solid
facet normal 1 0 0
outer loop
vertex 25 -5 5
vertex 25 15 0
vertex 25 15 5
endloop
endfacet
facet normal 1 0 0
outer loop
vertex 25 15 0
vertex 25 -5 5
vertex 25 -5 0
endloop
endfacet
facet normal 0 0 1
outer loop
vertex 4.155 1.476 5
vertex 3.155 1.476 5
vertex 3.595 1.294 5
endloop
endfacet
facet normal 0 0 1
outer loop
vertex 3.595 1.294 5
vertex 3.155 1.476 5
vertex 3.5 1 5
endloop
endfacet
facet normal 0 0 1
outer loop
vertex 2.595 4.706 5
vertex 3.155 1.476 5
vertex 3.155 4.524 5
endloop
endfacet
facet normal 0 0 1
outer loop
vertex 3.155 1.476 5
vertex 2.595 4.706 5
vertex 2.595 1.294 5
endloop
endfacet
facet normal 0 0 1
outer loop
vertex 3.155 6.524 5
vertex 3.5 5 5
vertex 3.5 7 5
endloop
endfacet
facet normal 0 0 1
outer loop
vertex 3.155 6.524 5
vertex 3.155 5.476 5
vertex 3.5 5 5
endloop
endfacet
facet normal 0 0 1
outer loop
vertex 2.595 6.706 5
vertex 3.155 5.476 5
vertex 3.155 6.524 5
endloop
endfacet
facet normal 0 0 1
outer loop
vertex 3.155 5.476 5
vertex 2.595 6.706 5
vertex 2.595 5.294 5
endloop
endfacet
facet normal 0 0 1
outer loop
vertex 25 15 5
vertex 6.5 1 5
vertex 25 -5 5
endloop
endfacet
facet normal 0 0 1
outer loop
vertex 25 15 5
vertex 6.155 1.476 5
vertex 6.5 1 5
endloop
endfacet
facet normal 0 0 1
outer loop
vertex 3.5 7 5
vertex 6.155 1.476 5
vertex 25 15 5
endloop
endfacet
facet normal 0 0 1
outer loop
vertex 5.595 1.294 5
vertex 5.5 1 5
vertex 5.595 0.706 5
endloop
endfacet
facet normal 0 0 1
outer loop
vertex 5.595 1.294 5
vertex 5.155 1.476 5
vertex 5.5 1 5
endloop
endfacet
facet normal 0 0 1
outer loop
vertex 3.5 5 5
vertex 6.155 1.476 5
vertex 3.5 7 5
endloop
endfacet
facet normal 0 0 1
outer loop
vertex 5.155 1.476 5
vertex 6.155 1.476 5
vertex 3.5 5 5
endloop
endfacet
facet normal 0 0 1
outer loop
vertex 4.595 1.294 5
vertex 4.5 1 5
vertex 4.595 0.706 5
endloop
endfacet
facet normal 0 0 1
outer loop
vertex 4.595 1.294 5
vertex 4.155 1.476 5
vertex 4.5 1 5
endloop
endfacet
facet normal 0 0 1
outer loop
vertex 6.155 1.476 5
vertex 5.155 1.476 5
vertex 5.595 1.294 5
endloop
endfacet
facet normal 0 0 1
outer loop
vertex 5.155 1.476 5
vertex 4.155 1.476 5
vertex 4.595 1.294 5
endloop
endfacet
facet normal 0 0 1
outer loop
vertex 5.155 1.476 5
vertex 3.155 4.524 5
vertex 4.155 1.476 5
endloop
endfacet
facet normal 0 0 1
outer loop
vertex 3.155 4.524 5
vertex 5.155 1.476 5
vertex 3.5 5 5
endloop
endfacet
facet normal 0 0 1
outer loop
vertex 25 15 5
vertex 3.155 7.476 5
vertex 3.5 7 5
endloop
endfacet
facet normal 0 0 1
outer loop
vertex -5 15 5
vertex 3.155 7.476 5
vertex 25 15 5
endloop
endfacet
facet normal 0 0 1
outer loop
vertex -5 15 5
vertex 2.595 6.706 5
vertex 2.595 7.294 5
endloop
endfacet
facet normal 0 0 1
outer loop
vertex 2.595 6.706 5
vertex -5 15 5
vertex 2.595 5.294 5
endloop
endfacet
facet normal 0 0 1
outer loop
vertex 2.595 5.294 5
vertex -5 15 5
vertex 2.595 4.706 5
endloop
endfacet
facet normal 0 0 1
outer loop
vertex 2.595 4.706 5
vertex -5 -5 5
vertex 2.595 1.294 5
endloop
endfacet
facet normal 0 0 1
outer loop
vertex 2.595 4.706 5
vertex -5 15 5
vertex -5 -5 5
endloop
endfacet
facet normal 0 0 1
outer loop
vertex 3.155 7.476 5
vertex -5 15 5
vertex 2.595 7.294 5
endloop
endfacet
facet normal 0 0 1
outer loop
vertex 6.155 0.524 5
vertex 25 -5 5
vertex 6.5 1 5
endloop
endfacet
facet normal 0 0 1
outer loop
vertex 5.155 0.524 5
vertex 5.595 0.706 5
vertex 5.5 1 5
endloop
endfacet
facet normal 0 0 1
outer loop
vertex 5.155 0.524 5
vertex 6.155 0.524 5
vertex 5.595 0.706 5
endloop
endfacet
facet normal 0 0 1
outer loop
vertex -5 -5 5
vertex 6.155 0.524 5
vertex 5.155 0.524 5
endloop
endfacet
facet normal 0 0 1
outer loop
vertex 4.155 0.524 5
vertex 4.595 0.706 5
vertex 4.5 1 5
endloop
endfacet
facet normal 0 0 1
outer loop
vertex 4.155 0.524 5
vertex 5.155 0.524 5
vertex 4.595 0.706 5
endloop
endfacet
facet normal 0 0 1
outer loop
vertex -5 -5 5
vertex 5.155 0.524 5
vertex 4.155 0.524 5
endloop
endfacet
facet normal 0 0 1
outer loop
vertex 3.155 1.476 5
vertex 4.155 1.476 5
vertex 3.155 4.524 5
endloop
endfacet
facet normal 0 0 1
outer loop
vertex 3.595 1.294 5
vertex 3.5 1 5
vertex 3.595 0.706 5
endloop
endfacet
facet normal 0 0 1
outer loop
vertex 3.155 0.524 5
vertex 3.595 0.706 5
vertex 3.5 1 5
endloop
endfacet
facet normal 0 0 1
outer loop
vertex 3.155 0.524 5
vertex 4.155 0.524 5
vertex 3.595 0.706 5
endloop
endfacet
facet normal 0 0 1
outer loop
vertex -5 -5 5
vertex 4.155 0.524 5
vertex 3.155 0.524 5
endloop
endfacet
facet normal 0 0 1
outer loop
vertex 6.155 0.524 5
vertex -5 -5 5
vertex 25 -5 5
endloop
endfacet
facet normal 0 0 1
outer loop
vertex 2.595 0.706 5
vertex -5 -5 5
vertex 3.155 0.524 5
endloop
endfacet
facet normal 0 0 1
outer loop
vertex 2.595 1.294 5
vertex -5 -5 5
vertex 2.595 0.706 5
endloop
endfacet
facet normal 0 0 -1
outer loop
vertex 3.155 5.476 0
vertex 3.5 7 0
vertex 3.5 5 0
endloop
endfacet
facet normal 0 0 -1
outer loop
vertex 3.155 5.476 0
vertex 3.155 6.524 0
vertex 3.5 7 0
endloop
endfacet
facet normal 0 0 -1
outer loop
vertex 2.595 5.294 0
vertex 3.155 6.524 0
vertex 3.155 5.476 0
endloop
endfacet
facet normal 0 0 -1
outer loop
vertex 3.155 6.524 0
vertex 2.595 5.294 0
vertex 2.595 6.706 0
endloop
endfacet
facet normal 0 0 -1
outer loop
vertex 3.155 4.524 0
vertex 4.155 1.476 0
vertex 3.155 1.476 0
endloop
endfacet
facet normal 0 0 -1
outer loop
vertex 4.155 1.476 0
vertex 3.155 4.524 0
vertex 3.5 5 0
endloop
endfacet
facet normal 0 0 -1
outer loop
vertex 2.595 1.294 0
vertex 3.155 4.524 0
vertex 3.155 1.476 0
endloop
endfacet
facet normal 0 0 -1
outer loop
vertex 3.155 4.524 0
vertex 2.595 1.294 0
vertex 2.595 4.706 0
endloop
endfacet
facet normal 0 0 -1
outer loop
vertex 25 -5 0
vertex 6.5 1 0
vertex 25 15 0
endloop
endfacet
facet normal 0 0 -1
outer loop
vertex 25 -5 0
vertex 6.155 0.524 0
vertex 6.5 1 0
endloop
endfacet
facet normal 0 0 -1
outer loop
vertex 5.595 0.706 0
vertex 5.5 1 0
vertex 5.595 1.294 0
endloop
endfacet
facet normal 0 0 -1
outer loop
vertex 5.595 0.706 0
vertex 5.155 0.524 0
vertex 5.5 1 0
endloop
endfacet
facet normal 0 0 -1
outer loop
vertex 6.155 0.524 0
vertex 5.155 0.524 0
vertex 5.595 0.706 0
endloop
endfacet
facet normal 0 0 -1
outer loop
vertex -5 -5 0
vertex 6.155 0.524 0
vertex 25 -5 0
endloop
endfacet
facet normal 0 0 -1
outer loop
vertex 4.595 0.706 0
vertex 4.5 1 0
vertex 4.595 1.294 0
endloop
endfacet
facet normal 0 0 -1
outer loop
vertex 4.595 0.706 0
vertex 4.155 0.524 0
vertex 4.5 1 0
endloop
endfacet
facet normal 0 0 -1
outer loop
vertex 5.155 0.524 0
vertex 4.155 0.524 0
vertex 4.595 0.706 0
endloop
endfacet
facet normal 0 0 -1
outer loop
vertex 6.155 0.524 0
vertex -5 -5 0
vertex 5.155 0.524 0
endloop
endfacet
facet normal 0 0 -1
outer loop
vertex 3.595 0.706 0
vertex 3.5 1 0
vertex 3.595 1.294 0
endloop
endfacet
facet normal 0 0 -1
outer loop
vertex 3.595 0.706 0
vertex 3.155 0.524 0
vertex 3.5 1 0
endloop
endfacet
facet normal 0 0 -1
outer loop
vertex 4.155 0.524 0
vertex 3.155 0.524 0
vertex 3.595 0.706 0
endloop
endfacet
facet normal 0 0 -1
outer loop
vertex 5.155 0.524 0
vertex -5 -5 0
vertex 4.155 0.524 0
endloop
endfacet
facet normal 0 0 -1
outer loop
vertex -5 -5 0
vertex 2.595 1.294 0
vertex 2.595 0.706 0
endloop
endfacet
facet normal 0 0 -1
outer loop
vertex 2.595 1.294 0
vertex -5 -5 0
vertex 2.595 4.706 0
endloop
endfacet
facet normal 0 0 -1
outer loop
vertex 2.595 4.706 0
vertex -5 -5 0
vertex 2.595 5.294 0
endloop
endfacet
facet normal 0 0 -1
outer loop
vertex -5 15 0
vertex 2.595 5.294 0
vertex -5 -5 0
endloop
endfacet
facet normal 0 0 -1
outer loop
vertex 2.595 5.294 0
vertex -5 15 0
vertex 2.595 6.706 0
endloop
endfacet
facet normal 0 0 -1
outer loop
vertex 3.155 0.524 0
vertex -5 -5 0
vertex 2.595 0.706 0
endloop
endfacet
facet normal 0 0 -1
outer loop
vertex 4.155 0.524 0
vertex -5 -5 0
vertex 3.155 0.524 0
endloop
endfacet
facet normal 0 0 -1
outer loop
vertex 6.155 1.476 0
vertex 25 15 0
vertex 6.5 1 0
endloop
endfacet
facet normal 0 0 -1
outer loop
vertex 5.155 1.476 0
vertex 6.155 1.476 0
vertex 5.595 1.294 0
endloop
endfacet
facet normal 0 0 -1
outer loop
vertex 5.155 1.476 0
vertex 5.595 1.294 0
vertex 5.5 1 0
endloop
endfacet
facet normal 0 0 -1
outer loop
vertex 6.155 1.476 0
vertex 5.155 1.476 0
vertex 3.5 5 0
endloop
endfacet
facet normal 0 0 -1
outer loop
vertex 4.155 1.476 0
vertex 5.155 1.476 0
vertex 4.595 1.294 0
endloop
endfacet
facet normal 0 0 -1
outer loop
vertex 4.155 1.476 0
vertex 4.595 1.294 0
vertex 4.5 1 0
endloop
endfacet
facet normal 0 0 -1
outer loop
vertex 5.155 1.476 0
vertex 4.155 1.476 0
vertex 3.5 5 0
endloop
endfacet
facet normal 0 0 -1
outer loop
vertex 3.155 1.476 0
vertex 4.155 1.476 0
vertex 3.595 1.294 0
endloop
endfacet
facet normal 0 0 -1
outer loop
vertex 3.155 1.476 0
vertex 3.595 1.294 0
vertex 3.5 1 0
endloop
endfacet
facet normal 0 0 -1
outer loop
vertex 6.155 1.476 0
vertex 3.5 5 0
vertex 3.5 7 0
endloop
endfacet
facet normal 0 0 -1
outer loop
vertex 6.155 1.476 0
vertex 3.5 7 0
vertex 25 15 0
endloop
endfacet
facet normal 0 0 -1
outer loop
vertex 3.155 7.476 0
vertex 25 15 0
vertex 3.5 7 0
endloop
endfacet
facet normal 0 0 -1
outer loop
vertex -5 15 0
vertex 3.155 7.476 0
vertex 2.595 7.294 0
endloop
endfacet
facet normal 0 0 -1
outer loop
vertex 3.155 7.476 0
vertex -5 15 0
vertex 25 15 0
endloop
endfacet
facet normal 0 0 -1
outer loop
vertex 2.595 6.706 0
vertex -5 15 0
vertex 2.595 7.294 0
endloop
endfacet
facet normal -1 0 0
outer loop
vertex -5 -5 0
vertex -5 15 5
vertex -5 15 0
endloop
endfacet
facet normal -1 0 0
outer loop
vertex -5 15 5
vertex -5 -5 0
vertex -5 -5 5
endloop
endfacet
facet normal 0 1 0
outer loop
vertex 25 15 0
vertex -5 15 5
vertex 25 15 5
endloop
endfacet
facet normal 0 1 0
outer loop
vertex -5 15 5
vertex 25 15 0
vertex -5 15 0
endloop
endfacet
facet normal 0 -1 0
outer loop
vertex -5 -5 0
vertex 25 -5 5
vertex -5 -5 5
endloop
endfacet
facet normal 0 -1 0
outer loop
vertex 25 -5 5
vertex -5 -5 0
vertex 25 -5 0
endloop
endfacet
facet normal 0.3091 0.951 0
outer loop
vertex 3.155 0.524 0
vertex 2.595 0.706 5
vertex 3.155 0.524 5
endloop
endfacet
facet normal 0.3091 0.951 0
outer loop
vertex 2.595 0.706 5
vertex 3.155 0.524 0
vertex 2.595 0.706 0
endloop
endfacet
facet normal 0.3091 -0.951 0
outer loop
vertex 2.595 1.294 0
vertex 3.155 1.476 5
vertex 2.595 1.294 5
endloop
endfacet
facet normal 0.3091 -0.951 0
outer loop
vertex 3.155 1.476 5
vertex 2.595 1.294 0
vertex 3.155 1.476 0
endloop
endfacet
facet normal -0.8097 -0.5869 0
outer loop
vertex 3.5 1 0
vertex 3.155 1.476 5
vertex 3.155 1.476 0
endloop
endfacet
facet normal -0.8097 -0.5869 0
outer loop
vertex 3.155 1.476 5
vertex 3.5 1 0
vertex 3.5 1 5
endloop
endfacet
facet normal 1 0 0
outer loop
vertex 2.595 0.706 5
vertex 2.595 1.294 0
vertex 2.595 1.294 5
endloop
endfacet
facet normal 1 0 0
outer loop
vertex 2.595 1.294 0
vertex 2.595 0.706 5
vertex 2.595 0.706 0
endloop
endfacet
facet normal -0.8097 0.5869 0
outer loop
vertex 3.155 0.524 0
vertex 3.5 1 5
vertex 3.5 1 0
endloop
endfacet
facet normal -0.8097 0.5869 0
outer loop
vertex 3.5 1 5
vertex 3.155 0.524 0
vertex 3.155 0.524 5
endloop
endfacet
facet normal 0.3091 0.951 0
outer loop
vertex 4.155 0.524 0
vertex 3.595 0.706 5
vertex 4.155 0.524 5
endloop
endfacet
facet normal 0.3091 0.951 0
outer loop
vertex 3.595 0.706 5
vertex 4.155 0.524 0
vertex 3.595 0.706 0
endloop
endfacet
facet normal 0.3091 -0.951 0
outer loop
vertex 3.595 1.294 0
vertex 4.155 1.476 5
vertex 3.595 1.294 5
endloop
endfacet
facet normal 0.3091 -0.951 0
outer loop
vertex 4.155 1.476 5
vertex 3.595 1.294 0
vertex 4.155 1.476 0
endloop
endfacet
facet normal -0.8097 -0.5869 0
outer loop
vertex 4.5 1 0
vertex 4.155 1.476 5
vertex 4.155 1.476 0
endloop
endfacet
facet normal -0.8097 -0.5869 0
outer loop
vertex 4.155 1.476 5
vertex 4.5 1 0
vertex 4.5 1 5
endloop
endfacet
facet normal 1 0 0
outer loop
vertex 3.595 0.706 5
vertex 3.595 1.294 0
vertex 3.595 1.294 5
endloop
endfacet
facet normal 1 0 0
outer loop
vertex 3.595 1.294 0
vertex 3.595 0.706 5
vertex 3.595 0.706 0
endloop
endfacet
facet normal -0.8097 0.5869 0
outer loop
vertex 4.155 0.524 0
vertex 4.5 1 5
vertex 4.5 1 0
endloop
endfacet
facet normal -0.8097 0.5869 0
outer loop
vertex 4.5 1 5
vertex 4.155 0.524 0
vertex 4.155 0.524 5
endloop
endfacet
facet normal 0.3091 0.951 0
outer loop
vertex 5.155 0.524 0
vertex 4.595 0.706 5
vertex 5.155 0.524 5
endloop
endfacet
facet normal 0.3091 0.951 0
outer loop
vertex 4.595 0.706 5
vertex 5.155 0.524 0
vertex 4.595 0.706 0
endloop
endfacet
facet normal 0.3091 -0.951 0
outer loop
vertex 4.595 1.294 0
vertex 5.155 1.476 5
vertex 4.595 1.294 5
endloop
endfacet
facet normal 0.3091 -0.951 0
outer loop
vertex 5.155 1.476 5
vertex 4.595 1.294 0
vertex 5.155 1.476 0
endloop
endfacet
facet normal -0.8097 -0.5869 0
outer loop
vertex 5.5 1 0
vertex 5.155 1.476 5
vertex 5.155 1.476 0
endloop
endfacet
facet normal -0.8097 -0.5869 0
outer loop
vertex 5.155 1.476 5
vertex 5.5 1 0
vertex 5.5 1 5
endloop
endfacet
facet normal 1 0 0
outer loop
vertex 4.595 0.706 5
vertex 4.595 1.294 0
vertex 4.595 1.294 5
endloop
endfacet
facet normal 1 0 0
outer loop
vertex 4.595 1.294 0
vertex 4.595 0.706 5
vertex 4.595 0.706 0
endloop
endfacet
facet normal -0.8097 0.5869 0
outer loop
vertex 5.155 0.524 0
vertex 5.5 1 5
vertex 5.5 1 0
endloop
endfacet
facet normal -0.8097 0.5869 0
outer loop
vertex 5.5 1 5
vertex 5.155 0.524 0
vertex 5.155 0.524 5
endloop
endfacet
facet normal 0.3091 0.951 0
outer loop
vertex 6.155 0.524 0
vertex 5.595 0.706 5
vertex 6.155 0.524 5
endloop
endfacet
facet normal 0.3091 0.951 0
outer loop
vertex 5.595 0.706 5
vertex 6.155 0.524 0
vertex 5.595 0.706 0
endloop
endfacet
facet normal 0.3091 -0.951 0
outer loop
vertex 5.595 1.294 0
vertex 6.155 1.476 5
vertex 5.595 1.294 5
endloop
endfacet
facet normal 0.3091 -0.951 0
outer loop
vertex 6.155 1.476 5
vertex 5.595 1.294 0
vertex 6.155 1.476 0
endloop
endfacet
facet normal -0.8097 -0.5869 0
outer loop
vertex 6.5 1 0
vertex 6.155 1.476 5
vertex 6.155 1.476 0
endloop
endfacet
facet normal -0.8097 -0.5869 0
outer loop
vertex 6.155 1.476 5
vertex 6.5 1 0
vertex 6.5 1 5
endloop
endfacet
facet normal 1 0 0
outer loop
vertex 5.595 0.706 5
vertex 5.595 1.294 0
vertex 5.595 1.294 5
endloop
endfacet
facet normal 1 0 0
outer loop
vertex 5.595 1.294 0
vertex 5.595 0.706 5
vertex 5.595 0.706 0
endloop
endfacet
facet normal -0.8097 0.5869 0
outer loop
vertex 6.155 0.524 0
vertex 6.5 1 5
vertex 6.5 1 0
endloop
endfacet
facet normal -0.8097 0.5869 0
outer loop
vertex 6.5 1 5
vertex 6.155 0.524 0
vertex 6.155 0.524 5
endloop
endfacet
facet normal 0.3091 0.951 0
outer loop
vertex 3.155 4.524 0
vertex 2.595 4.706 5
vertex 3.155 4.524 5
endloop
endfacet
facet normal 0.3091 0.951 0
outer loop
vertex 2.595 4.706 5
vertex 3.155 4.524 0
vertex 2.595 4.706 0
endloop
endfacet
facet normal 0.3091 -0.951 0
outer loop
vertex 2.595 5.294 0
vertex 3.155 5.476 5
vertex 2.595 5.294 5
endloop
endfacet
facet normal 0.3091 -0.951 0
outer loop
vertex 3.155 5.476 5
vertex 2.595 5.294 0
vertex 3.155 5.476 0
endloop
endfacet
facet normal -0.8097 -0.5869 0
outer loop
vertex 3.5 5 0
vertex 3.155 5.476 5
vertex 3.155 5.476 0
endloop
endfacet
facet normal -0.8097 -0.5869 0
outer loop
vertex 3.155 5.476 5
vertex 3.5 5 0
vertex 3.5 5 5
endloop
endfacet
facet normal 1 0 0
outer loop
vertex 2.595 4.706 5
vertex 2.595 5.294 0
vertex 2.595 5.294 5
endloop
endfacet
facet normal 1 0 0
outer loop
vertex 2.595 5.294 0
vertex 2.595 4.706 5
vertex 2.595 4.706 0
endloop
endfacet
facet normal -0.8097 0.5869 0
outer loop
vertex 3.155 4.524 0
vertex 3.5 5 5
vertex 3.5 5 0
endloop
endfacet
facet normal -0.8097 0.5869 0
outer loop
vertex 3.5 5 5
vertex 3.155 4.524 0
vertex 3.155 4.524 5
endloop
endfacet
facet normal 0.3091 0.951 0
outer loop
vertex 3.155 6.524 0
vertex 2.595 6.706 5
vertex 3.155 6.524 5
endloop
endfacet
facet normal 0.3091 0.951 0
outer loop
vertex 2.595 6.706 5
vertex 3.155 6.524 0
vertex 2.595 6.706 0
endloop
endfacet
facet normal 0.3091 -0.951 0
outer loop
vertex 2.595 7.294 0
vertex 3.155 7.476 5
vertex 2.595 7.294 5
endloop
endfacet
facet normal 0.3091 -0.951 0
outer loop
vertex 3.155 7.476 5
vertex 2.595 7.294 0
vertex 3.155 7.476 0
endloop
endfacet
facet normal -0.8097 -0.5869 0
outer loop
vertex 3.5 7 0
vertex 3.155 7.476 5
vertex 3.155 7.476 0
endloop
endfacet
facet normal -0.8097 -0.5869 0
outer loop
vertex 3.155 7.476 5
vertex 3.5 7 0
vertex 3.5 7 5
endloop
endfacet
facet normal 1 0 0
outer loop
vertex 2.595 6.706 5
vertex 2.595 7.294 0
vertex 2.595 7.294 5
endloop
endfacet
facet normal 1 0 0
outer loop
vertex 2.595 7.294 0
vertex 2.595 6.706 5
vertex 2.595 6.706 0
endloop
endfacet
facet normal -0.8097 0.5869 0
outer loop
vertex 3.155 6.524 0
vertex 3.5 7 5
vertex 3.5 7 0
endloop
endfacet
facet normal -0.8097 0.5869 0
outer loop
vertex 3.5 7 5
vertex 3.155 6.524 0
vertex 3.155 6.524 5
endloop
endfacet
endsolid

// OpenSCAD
jigFrameSize = 5;    // Extra material around edge of pcba (mm)
jigThickness = 5;    // Thickness of the jig (mm)
pogoPinDiameter = 1;        // Diameter of the pogo pin (mm)

module hole(x, y)
{
	translate([x,y,jigThickness/2])
		cylinder(r = pogoPinDiameter/2,
				jigThickness*1.1,
				center = true);
}

module jig(width, height)
{
	translate([-jigFrameSize,-jigFrameSize])
	    cube([width + 2*jigFrameSize,
			height + 2*jigFrameSize,
			jigThickness],
			center = false);
}

difference() {
	jig(20, 10);  // Put in the board dimensions here
	hole(3,1);    // Then add one of these for every hole
	hole(4,1);
	hole(5,1);
	hole(6,1);
	hole(3,5);
	hole(3,7);
}
